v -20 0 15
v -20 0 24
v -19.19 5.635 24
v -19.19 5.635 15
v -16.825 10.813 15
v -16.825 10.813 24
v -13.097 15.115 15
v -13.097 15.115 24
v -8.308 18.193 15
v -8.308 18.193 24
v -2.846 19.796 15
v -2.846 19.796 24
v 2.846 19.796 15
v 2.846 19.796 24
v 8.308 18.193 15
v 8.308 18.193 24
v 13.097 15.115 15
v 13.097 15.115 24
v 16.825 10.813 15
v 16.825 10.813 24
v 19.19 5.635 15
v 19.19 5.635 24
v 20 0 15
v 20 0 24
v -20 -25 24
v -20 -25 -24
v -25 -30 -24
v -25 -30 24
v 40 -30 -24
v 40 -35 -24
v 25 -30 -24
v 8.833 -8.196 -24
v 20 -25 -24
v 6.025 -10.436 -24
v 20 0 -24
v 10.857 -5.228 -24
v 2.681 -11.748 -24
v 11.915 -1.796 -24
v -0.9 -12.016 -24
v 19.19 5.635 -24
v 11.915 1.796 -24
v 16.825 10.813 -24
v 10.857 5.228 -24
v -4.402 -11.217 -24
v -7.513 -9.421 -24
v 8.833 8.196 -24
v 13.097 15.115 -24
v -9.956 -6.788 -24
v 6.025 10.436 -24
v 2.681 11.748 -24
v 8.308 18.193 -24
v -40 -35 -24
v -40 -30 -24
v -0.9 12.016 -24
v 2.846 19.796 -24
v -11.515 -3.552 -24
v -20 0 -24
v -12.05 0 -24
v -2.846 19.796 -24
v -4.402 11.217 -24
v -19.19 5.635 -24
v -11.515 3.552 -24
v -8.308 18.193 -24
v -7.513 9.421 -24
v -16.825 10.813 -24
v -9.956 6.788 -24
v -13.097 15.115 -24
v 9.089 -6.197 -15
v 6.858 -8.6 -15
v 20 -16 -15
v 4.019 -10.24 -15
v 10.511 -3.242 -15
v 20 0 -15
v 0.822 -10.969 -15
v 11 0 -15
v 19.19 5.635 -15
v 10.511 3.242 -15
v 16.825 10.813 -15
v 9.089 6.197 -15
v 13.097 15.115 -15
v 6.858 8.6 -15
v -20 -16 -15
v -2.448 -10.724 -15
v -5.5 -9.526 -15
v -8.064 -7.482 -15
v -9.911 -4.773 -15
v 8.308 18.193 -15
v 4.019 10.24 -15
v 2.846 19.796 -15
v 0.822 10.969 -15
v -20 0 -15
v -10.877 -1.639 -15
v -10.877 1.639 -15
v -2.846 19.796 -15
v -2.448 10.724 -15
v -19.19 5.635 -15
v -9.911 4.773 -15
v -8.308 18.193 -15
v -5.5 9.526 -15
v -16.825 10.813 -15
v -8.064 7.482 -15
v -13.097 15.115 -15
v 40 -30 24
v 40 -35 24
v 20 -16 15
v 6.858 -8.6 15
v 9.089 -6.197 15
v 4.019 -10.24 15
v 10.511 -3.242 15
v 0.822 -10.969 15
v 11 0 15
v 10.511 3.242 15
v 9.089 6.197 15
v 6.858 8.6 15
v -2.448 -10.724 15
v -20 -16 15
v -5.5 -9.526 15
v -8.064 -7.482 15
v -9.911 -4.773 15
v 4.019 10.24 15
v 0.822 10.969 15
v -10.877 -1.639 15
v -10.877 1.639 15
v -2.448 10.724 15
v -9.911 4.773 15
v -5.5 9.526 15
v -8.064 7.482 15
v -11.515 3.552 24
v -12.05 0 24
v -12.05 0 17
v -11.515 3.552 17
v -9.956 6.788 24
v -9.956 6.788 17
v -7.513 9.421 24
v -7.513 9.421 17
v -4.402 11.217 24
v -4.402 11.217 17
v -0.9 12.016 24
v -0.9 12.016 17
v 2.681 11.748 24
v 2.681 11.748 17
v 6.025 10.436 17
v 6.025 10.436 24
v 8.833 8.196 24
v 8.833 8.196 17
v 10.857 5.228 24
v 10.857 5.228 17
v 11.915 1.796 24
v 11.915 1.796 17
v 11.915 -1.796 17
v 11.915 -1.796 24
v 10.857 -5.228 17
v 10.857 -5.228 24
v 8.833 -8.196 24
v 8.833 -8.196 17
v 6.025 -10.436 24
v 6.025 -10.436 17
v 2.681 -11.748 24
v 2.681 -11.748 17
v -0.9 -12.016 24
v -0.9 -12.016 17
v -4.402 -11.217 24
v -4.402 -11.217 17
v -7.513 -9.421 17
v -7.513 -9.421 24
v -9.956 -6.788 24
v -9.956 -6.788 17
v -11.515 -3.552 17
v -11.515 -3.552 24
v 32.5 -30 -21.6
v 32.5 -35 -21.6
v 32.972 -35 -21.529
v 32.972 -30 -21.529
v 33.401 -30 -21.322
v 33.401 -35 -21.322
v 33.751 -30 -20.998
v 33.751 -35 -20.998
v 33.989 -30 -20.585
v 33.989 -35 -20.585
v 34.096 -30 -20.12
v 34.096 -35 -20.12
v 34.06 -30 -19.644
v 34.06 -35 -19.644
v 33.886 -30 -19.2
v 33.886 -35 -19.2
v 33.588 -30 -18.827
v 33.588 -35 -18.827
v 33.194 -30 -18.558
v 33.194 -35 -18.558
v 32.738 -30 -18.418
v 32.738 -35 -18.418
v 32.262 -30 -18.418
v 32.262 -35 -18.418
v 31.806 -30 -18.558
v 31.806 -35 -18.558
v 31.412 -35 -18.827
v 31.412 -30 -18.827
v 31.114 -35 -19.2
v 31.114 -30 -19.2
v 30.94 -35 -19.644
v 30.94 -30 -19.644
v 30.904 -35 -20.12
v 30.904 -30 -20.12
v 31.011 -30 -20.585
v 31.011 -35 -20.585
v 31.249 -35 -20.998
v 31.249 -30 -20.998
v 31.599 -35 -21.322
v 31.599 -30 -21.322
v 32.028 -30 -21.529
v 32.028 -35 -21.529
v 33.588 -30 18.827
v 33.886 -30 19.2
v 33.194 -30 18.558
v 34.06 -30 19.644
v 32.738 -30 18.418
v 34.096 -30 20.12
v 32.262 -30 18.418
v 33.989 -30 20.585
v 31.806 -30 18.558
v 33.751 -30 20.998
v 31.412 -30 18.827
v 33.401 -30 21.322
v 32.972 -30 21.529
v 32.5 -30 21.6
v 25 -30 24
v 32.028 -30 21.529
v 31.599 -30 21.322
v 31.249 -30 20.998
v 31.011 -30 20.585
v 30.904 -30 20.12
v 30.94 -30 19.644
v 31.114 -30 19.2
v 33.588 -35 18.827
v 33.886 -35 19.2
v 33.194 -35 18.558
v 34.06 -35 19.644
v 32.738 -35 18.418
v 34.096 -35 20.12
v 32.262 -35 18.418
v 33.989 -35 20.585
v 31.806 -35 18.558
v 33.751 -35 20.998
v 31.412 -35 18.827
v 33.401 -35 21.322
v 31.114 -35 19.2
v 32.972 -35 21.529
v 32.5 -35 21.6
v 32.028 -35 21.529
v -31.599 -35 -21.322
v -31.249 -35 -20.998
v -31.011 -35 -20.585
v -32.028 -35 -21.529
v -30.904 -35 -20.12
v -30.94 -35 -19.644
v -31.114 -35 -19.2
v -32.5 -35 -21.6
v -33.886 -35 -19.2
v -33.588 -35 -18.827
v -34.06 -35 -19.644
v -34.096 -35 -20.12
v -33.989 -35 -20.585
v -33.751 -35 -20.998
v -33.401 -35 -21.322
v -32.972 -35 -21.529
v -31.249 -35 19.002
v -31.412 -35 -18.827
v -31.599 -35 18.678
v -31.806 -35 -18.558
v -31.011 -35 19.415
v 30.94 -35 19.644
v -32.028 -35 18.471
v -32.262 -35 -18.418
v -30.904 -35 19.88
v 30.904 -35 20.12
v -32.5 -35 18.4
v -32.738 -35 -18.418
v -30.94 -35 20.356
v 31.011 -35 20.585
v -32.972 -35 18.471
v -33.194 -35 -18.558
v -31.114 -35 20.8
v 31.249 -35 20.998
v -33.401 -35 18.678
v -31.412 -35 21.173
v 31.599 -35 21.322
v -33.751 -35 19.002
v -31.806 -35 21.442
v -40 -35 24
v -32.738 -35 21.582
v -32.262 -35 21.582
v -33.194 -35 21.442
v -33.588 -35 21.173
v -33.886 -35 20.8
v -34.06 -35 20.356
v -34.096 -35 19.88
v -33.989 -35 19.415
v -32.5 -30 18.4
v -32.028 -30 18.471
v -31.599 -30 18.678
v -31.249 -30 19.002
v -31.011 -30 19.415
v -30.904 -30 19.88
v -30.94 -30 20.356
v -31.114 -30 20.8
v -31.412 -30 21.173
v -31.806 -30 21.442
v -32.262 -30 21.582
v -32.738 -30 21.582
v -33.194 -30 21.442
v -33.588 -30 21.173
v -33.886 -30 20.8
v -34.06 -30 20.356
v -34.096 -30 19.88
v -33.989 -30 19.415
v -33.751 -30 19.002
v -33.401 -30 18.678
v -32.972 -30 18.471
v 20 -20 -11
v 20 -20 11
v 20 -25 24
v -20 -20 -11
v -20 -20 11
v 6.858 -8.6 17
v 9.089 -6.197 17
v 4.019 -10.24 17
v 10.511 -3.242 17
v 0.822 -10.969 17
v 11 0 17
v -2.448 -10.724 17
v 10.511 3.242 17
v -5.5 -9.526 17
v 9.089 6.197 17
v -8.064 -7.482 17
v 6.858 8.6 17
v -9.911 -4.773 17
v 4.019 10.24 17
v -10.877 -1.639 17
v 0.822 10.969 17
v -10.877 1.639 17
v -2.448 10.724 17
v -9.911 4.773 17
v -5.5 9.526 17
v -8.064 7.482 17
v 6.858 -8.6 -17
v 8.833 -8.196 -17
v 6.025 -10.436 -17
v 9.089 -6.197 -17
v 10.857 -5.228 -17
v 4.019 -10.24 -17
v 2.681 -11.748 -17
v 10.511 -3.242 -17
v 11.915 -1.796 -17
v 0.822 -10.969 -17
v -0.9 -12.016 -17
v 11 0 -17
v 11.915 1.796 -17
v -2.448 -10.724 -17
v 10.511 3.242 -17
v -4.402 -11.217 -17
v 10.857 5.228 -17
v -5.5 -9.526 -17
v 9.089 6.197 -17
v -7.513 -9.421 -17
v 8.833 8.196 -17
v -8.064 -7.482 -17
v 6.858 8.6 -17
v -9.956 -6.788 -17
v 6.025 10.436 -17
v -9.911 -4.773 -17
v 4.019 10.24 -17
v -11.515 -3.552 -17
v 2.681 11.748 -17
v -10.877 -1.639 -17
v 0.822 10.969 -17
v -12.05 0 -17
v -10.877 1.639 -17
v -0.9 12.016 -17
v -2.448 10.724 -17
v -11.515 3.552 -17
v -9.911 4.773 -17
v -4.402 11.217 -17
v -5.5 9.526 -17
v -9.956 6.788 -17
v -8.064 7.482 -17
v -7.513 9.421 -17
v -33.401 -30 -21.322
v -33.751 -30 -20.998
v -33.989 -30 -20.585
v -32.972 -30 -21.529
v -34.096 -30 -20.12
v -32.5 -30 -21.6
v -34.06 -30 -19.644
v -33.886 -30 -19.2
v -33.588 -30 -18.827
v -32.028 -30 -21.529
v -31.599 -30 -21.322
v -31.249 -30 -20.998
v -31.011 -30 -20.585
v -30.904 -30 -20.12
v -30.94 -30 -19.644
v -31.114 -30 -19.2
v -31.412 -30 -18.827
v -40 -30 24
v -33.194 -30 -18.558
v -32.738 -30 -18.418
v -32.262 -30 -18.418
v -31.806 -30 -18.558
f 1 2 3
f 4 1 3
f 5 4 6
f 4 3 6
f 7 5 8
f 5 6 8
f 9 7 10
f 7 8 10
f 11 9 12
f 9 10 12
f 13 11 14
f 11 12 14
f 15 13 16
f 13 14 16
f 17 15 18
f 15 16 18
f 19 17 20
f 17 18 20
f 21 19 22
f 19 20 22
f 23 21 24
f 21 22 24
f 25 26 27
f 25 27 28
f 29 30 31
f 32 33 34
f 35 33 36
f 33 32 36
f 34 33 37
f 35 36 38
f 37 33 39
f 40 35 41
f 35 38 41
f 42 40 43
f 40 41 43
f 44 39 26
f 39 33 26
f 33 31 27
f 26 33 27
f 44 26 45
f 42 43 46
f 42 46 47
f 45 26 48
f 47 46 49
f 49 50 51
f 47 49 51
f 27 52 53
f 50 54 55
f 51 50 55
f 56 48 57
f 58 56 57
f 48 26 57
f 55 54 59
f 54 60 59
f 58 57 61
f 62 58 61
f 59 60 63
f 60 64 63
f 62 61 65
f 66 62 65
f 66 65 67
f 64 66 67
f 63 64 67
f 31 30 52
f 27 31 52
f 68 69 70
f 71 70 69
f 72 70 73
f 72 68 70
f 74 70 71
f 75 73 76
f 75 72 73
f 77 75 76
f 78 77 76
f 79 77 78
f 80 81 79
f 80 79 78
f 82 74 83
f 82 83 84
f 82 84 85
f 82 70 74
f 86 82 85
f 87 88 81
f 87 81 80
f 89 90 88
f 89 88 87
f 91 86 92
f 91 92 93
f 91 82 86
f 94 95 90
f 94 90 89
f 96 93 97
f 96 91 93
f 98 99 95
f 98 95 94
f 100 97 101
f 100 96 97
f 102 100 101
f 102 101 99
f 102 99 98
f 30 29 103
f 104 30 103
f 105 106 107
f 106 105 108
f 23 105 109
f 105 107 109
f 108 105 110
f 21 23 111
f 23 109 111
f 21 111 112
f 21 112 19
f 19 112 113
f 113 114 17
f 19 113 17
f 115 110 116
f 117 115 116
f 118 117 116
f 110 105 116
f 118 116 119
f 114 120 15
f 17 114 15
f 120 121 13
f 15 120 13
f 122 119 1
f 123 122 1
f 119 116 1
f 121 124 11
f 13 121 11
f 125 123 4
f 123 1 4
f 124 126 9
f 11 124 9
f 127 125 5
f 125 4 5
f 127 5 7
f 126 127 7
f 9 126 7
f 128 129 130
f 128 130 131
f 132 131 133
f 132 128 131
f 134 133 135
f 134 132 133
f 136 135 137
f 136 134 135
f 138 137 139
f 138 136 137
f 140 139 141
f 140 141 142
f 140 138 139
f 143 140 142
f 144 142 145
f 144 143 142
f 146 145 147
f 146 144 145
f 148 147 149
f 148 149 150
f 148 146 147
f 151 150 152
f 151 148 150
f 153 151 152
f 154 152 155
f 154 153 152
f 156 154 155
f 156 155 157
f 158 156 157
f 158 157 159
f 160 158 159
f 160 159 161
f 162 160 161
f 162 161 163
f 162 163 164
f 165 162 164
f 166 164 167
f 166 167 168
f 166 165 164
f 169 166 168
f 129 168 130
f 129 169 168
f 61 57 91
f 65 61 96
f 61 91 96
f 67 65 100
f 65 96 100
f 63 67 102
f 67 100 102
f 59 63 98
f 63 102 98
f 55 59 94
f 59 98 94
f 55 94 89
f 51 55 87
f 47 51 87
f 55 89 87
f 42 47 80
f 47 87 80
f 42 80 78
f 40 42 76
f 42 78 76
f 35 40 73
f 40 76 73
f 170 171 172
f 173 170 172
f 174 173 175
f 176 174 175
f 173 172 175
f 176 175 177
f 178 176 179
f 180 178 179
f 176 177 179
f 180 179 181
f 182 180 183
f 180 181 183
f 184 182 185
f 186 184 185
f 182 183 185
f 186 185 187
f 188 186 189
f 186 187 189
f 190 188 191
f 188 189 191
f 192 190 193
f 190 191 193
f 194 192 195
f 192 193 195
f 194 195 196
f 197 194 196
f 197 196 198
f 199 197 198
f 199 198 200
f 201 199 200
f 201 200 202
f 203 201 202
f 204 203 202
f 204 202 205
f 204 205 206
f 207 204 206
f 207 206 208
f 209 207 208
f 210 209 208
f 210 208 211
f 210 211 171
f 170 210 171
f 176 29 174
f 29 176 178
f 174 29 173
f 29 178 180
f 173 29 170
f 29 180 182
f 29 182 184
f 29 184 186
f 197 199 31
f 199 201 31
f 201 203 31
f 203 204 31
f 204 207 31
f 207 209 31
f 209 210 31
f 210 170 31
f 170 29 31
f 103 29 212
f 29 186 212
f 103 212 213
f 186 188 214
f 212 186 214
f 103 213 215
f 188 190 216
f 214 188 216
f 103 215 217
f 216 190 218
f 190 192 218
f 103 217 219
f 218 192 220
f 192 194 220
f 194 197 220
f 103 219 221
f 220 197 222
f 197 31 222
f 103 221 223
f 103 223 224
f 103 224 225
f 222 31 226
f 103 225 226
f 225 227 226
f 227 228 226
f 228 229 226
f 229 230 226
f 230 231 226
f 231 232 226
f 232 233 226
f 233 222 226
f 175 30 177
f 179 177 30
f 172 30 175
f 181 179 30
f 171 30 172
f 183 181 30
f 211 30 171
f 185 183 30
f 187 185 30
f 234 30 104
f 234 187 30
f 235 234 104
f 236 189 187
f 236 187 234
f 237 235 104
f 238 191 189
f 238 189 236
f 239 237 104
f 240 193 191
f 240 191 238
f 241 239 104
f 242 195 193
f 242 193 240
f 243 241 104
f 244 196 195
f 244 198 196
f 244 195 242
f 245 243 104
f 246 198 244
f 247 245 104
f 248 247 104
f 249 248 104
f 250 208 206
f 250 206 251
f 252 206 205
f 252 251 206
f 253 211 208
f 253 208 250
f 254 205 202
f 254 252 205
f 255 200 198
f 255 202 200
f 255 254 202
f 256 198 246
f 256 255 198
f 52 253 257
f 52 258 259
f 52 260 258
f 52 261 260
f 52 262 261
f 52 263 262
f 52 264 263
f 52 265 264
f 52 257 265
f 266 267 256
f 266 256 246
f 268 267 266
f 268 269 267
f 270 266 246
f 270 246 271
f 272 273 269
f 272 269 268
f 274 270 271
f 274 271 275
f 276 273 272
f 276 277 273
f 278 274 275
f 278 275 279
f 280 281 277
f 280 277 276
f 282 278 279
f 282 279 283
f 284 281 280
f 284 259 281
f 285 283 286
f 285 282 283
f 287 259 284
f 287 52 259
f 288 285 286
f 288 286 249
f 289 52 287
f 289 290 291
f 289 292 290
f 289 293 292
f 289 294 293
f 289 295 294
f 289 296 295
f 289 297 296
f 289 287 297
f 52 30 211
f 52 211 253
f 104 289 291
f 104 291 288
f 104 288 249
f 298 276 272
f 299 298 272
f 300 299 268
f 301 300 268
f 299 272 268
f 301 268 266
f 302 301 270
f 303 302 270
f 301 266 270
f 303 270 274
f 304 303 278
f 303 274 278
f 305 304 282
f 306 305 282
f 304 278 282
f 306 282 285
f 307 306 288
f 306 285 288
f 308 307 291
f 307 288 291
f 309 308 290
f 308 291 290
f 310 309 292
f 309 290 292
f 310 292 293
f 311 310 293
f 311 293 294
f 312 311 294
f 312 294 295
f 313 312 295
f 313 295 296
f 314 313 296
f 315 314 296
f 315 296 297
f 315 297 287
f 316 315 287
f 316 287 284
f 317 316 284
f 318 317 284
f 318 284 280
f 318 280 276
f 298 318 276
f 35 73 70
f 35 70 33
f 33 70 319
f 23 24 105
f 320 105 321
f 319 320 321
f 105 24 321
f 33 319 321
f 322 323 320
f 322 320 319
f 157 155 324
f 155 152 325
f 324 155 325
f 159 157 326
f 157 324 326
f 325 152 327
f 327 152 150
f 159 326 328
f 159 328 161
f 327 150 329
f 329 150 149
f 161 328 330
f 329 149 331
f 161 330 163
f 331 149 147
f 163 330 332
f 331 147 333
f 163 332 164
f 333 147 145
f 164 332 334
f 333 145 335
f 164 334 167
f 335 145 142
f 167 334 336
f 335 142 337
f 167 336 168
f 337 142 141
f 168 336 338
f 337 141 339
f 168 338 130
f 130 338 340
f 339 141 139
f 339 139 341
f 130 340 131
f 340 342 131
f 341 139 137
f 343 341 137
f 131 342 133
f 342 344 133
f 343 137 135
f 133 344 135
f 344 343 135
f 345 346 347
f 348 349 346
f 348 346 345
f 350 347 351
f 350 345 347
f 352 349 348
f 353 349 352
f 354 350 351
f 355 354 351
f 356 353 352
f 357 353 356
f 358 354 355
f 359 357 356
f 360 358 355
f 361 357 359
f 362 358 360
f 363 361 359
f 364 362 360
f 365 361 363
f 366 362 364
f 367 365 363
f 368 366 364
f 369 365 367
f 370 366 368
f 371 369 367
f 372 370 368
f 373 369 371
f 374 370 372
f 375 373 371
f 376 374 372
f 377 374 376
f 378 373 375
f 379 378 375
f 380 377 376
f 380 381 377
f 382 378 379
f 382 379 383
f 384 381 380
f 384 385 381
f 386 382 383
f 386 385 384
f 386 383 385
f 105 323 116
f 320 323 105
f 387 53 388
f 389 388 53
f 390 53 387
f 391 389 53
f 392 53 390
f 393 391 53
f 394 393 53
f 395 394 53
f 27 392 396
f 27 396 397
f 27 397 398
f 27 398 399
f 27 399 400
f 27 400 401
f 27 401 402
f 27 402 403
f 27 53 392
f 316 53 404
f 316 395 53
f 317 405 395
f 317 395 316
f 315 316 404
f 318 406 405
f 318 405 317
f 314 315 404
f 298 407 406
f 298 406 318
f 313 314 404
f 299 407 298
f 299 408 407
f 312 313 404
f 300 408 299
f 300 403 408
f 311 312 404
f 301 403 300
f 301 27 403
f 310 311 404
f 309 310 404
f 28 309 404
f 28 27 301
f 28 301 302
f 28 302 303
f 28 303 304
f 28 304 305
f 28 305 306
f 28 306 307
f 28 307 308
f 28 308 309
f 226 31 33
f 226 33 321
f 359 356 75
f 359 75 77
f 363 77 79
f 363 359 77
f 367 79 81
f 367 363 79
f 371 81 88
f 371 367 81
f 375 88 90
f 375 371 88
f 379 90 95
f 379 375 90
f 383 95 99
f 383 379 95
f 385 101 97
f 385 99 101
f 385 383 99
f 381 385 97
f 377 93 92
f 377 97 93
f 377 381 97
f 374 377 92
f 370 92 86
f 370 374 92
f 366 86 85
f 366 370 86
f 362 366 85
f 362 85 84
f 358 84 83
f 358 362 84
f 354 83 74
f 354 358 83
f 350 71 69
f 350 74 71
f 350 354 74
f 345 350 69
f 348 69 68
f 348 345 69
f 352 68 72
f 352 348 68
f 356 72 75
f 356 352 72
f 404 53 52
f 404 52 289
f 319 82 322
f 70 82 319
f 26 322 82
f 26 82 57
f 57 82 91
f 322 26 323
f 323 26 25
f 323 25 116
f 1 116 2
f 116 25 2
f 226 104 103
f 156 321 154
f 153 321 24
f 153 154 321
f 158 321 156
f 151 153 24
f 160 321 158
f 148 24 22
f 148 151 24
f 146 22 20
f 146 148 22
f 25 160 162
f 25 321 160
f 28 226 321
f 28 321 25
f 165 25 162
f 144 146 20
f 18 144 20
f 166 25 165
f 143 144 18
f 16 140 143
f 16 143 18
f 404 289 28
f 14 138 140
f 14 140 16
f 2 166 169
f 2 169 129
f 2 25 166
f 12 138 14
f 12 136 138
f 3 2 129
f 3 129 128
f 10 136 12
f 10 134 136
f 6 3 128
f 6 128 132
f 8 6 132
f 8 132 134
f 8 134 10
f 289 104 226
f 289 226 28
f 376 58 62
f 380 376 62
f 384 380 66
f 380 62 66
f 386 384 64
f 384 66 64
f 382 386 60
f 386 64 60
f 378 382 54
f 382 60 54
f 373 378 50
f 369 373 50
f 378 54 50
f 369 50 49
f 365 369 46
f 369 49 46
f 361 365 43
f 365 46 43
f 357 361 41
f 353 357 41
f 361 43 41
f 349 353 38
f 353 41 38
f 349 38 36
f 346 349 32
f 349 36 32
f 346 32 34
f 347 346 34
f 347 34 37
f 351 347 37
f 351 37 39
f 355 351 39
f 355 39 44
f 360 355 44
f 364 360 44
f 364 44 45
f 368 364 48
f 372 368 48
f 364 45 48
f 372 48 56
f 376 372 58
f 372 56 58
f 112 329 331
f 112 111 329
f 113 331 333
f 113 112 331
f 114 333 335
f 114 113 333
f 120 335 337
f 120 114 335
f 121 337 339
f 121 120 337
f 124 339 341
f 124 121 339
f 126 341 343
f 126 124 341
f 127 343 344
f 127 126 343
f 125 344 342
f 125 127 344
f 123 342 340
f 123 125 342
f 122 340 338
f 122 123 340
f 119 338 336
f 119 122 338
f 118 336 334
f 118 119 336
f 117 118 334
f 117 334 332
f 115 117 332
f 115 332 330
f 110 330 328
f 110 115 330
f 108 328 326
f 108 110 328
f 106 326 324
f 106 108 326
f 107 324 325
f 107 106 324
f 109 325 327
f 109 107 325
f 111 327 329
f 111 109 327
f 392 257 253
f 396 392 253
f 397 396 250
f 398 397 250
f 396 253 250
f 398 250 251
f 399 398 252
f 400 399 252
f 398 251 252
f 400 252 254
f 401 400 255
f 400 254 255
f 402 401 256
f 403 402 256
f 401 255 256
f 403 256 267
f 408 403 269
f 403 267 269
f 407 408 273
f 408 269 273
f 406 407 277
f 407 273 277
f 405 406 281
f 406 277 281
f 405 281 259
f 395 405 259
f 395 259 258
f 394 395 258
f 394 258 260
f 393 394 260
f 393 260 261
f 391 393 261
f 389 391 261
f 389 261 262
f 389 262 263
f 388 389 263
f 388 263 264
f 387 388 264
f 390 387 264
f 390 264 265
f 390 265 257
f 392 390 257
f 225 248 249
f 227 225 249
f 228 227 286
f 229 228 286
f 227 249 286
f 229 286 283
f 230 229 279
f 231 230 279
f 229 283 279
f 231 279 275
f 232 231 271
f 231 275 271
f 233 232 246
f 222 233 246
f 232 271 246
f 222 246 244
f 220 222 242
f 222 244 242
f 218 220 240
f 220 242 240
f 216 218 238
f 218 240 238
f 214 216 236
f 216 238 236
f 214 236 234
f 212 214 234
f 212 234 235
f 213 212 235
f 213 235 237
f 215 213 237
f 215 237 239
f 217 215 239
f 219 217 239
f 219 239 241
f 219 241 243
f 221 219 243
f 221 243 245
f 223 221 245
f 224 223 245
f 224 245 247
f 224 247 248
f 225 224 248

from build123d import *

# Parameters (mm, degrees)
SKETCH_1_R               = 11
EXTRUDE_1_DEPTH          = 24
CUT_EXTRUDE_1_DEPTH      = 47.914816423
CUT_EXTRUDE_1_DEPTH_BACK = 47.914816423
SKETCH_2_W               = 30
SKETCH_2_H               = 69.949963181
SKETCH_4_R               = 12.05
CUT_EXTRUDE_3_DEPTH      = 7
CHAMFER_2_SIZE           = 4
SKETCH_5_W               = 48
SKETCH_5_H               = 5
EXTRUDE_2_DEPTH          = 20
CHAMFER_3_SIZE           = 5
SKETCH_6_R               = 1.6
CUT_EXTRUDE_4_DEPTH      = 73.117958928


with BuildPart() as part:
    # 草图1 → 凸台-拉伸1 (new, symmetric)
    with BuildSketch(Plane.XY):
        with BuildLine():
            Line((-20, -35), (-20, 0))
            ThreePointArc((-20, 0), (0, 20), (20, 0))
            Line((20, 0), (20, -35))
            Line((20, -35), (-20, -35))
        make_face()
        Circle(SKETCH_1_R, mode=Mode.SUBTRACT)
    extrude(amount=EXTRUDE_1_DEPTH, both=True)

    # 草图2 → 切除-拉伸1 (cut, two sides: drawn at the far end of the back side and taken through both)
    with BuildSketch(Plane(origin=(0, 0, 0), x_dir=(0, 0, -1), z_dir=(1, 0, 0)).offset(-CUT_EXTRUDE_1_DEPTH_BACK)):
        with Locations((0, 14.974981591)):
            Rectangle(SKETCH_2_W, SKETCH_2_H)
    extrude(amount=CUT_EXTRUDE_1_DEPTH + CUT_EXTRUDE_1_DEPTH_BACK, mode=Mode.SUBTRACT)

    # 草图4 → 切除-拉伸3 (cut)
    with BuildSketch(Plane(origin=(0, 0, -24), x_dir=(-1, 0, 0), z_dir=(0, 0, -1))):
        Circle(SKETCH_4_R)
    cut_extrude_3 = extrude(amount=-CUT_EXTRUDE_3_DEPTH, mode=Mode.SUBTRACT)

    # 倒角2
    chamfer_2_edges = [part.edges().sort_by_distance(p)[0] for p in [
        (0, -20, 15),
        (0, -20, -15),
    ]]
    chamfer(chamfer_2_edges, length=CHAMFER_2_SIZE)

    # 镜向1: 切除-拉伸3 across plane
    add(cut_extrude_3.mirror(Plane.XY), mode=Mode.SUBTRACT)

    # 草图5 → 凸台-拉伸2 (add)
    with BuildSketch(Plane.ZY.offset(20)):
        with Locations((0, -32.5)):
            Rectangle(SKETCH_5_W, SKETCH_5_H)
    extrude_2 = extrude(amount=EXTRUDE_2_DEPTH)

    # 镜向2: 凸台-拉伸2 across plane
    add(extrude_2.mirror(Plane.ZY))

    # 倒角3
    chamfer_3_edges = [part.edges().sort_by_distance(p)[0] for p in [
        (-20, -30, 0),
        (20, -30, 0),
    ]]
    chamfer(chamfer_3_edges, length=CHAMFER_3_SIZE)

    # 草图6 → 切除-拉伸4 (cut, through all)
    with BuildSketch(Plane.XZ.offset(35)):
        with Locations(Location((32.5, -20, 0), (0, 0, 270))):
            Circle(SKETCH_6_R)
        with Locations(Location((-32.5, -20, 0), (0, 0, 270))):
            Circle(SKETCH_6_R)
        with Locations(Location((-32.5, 20, 0), (0, 0, 270))):
            Circle(SKETCH_6_R)
        with Locations(Location((32.5, 20, 0), (0, 0, 90))):
            Circle(SKETCH_6_R)
    extrude(amount=-CUT_EXTRUDE_4_DEPTH, mode=Mode.SUBTRACT)


solid = part.part
